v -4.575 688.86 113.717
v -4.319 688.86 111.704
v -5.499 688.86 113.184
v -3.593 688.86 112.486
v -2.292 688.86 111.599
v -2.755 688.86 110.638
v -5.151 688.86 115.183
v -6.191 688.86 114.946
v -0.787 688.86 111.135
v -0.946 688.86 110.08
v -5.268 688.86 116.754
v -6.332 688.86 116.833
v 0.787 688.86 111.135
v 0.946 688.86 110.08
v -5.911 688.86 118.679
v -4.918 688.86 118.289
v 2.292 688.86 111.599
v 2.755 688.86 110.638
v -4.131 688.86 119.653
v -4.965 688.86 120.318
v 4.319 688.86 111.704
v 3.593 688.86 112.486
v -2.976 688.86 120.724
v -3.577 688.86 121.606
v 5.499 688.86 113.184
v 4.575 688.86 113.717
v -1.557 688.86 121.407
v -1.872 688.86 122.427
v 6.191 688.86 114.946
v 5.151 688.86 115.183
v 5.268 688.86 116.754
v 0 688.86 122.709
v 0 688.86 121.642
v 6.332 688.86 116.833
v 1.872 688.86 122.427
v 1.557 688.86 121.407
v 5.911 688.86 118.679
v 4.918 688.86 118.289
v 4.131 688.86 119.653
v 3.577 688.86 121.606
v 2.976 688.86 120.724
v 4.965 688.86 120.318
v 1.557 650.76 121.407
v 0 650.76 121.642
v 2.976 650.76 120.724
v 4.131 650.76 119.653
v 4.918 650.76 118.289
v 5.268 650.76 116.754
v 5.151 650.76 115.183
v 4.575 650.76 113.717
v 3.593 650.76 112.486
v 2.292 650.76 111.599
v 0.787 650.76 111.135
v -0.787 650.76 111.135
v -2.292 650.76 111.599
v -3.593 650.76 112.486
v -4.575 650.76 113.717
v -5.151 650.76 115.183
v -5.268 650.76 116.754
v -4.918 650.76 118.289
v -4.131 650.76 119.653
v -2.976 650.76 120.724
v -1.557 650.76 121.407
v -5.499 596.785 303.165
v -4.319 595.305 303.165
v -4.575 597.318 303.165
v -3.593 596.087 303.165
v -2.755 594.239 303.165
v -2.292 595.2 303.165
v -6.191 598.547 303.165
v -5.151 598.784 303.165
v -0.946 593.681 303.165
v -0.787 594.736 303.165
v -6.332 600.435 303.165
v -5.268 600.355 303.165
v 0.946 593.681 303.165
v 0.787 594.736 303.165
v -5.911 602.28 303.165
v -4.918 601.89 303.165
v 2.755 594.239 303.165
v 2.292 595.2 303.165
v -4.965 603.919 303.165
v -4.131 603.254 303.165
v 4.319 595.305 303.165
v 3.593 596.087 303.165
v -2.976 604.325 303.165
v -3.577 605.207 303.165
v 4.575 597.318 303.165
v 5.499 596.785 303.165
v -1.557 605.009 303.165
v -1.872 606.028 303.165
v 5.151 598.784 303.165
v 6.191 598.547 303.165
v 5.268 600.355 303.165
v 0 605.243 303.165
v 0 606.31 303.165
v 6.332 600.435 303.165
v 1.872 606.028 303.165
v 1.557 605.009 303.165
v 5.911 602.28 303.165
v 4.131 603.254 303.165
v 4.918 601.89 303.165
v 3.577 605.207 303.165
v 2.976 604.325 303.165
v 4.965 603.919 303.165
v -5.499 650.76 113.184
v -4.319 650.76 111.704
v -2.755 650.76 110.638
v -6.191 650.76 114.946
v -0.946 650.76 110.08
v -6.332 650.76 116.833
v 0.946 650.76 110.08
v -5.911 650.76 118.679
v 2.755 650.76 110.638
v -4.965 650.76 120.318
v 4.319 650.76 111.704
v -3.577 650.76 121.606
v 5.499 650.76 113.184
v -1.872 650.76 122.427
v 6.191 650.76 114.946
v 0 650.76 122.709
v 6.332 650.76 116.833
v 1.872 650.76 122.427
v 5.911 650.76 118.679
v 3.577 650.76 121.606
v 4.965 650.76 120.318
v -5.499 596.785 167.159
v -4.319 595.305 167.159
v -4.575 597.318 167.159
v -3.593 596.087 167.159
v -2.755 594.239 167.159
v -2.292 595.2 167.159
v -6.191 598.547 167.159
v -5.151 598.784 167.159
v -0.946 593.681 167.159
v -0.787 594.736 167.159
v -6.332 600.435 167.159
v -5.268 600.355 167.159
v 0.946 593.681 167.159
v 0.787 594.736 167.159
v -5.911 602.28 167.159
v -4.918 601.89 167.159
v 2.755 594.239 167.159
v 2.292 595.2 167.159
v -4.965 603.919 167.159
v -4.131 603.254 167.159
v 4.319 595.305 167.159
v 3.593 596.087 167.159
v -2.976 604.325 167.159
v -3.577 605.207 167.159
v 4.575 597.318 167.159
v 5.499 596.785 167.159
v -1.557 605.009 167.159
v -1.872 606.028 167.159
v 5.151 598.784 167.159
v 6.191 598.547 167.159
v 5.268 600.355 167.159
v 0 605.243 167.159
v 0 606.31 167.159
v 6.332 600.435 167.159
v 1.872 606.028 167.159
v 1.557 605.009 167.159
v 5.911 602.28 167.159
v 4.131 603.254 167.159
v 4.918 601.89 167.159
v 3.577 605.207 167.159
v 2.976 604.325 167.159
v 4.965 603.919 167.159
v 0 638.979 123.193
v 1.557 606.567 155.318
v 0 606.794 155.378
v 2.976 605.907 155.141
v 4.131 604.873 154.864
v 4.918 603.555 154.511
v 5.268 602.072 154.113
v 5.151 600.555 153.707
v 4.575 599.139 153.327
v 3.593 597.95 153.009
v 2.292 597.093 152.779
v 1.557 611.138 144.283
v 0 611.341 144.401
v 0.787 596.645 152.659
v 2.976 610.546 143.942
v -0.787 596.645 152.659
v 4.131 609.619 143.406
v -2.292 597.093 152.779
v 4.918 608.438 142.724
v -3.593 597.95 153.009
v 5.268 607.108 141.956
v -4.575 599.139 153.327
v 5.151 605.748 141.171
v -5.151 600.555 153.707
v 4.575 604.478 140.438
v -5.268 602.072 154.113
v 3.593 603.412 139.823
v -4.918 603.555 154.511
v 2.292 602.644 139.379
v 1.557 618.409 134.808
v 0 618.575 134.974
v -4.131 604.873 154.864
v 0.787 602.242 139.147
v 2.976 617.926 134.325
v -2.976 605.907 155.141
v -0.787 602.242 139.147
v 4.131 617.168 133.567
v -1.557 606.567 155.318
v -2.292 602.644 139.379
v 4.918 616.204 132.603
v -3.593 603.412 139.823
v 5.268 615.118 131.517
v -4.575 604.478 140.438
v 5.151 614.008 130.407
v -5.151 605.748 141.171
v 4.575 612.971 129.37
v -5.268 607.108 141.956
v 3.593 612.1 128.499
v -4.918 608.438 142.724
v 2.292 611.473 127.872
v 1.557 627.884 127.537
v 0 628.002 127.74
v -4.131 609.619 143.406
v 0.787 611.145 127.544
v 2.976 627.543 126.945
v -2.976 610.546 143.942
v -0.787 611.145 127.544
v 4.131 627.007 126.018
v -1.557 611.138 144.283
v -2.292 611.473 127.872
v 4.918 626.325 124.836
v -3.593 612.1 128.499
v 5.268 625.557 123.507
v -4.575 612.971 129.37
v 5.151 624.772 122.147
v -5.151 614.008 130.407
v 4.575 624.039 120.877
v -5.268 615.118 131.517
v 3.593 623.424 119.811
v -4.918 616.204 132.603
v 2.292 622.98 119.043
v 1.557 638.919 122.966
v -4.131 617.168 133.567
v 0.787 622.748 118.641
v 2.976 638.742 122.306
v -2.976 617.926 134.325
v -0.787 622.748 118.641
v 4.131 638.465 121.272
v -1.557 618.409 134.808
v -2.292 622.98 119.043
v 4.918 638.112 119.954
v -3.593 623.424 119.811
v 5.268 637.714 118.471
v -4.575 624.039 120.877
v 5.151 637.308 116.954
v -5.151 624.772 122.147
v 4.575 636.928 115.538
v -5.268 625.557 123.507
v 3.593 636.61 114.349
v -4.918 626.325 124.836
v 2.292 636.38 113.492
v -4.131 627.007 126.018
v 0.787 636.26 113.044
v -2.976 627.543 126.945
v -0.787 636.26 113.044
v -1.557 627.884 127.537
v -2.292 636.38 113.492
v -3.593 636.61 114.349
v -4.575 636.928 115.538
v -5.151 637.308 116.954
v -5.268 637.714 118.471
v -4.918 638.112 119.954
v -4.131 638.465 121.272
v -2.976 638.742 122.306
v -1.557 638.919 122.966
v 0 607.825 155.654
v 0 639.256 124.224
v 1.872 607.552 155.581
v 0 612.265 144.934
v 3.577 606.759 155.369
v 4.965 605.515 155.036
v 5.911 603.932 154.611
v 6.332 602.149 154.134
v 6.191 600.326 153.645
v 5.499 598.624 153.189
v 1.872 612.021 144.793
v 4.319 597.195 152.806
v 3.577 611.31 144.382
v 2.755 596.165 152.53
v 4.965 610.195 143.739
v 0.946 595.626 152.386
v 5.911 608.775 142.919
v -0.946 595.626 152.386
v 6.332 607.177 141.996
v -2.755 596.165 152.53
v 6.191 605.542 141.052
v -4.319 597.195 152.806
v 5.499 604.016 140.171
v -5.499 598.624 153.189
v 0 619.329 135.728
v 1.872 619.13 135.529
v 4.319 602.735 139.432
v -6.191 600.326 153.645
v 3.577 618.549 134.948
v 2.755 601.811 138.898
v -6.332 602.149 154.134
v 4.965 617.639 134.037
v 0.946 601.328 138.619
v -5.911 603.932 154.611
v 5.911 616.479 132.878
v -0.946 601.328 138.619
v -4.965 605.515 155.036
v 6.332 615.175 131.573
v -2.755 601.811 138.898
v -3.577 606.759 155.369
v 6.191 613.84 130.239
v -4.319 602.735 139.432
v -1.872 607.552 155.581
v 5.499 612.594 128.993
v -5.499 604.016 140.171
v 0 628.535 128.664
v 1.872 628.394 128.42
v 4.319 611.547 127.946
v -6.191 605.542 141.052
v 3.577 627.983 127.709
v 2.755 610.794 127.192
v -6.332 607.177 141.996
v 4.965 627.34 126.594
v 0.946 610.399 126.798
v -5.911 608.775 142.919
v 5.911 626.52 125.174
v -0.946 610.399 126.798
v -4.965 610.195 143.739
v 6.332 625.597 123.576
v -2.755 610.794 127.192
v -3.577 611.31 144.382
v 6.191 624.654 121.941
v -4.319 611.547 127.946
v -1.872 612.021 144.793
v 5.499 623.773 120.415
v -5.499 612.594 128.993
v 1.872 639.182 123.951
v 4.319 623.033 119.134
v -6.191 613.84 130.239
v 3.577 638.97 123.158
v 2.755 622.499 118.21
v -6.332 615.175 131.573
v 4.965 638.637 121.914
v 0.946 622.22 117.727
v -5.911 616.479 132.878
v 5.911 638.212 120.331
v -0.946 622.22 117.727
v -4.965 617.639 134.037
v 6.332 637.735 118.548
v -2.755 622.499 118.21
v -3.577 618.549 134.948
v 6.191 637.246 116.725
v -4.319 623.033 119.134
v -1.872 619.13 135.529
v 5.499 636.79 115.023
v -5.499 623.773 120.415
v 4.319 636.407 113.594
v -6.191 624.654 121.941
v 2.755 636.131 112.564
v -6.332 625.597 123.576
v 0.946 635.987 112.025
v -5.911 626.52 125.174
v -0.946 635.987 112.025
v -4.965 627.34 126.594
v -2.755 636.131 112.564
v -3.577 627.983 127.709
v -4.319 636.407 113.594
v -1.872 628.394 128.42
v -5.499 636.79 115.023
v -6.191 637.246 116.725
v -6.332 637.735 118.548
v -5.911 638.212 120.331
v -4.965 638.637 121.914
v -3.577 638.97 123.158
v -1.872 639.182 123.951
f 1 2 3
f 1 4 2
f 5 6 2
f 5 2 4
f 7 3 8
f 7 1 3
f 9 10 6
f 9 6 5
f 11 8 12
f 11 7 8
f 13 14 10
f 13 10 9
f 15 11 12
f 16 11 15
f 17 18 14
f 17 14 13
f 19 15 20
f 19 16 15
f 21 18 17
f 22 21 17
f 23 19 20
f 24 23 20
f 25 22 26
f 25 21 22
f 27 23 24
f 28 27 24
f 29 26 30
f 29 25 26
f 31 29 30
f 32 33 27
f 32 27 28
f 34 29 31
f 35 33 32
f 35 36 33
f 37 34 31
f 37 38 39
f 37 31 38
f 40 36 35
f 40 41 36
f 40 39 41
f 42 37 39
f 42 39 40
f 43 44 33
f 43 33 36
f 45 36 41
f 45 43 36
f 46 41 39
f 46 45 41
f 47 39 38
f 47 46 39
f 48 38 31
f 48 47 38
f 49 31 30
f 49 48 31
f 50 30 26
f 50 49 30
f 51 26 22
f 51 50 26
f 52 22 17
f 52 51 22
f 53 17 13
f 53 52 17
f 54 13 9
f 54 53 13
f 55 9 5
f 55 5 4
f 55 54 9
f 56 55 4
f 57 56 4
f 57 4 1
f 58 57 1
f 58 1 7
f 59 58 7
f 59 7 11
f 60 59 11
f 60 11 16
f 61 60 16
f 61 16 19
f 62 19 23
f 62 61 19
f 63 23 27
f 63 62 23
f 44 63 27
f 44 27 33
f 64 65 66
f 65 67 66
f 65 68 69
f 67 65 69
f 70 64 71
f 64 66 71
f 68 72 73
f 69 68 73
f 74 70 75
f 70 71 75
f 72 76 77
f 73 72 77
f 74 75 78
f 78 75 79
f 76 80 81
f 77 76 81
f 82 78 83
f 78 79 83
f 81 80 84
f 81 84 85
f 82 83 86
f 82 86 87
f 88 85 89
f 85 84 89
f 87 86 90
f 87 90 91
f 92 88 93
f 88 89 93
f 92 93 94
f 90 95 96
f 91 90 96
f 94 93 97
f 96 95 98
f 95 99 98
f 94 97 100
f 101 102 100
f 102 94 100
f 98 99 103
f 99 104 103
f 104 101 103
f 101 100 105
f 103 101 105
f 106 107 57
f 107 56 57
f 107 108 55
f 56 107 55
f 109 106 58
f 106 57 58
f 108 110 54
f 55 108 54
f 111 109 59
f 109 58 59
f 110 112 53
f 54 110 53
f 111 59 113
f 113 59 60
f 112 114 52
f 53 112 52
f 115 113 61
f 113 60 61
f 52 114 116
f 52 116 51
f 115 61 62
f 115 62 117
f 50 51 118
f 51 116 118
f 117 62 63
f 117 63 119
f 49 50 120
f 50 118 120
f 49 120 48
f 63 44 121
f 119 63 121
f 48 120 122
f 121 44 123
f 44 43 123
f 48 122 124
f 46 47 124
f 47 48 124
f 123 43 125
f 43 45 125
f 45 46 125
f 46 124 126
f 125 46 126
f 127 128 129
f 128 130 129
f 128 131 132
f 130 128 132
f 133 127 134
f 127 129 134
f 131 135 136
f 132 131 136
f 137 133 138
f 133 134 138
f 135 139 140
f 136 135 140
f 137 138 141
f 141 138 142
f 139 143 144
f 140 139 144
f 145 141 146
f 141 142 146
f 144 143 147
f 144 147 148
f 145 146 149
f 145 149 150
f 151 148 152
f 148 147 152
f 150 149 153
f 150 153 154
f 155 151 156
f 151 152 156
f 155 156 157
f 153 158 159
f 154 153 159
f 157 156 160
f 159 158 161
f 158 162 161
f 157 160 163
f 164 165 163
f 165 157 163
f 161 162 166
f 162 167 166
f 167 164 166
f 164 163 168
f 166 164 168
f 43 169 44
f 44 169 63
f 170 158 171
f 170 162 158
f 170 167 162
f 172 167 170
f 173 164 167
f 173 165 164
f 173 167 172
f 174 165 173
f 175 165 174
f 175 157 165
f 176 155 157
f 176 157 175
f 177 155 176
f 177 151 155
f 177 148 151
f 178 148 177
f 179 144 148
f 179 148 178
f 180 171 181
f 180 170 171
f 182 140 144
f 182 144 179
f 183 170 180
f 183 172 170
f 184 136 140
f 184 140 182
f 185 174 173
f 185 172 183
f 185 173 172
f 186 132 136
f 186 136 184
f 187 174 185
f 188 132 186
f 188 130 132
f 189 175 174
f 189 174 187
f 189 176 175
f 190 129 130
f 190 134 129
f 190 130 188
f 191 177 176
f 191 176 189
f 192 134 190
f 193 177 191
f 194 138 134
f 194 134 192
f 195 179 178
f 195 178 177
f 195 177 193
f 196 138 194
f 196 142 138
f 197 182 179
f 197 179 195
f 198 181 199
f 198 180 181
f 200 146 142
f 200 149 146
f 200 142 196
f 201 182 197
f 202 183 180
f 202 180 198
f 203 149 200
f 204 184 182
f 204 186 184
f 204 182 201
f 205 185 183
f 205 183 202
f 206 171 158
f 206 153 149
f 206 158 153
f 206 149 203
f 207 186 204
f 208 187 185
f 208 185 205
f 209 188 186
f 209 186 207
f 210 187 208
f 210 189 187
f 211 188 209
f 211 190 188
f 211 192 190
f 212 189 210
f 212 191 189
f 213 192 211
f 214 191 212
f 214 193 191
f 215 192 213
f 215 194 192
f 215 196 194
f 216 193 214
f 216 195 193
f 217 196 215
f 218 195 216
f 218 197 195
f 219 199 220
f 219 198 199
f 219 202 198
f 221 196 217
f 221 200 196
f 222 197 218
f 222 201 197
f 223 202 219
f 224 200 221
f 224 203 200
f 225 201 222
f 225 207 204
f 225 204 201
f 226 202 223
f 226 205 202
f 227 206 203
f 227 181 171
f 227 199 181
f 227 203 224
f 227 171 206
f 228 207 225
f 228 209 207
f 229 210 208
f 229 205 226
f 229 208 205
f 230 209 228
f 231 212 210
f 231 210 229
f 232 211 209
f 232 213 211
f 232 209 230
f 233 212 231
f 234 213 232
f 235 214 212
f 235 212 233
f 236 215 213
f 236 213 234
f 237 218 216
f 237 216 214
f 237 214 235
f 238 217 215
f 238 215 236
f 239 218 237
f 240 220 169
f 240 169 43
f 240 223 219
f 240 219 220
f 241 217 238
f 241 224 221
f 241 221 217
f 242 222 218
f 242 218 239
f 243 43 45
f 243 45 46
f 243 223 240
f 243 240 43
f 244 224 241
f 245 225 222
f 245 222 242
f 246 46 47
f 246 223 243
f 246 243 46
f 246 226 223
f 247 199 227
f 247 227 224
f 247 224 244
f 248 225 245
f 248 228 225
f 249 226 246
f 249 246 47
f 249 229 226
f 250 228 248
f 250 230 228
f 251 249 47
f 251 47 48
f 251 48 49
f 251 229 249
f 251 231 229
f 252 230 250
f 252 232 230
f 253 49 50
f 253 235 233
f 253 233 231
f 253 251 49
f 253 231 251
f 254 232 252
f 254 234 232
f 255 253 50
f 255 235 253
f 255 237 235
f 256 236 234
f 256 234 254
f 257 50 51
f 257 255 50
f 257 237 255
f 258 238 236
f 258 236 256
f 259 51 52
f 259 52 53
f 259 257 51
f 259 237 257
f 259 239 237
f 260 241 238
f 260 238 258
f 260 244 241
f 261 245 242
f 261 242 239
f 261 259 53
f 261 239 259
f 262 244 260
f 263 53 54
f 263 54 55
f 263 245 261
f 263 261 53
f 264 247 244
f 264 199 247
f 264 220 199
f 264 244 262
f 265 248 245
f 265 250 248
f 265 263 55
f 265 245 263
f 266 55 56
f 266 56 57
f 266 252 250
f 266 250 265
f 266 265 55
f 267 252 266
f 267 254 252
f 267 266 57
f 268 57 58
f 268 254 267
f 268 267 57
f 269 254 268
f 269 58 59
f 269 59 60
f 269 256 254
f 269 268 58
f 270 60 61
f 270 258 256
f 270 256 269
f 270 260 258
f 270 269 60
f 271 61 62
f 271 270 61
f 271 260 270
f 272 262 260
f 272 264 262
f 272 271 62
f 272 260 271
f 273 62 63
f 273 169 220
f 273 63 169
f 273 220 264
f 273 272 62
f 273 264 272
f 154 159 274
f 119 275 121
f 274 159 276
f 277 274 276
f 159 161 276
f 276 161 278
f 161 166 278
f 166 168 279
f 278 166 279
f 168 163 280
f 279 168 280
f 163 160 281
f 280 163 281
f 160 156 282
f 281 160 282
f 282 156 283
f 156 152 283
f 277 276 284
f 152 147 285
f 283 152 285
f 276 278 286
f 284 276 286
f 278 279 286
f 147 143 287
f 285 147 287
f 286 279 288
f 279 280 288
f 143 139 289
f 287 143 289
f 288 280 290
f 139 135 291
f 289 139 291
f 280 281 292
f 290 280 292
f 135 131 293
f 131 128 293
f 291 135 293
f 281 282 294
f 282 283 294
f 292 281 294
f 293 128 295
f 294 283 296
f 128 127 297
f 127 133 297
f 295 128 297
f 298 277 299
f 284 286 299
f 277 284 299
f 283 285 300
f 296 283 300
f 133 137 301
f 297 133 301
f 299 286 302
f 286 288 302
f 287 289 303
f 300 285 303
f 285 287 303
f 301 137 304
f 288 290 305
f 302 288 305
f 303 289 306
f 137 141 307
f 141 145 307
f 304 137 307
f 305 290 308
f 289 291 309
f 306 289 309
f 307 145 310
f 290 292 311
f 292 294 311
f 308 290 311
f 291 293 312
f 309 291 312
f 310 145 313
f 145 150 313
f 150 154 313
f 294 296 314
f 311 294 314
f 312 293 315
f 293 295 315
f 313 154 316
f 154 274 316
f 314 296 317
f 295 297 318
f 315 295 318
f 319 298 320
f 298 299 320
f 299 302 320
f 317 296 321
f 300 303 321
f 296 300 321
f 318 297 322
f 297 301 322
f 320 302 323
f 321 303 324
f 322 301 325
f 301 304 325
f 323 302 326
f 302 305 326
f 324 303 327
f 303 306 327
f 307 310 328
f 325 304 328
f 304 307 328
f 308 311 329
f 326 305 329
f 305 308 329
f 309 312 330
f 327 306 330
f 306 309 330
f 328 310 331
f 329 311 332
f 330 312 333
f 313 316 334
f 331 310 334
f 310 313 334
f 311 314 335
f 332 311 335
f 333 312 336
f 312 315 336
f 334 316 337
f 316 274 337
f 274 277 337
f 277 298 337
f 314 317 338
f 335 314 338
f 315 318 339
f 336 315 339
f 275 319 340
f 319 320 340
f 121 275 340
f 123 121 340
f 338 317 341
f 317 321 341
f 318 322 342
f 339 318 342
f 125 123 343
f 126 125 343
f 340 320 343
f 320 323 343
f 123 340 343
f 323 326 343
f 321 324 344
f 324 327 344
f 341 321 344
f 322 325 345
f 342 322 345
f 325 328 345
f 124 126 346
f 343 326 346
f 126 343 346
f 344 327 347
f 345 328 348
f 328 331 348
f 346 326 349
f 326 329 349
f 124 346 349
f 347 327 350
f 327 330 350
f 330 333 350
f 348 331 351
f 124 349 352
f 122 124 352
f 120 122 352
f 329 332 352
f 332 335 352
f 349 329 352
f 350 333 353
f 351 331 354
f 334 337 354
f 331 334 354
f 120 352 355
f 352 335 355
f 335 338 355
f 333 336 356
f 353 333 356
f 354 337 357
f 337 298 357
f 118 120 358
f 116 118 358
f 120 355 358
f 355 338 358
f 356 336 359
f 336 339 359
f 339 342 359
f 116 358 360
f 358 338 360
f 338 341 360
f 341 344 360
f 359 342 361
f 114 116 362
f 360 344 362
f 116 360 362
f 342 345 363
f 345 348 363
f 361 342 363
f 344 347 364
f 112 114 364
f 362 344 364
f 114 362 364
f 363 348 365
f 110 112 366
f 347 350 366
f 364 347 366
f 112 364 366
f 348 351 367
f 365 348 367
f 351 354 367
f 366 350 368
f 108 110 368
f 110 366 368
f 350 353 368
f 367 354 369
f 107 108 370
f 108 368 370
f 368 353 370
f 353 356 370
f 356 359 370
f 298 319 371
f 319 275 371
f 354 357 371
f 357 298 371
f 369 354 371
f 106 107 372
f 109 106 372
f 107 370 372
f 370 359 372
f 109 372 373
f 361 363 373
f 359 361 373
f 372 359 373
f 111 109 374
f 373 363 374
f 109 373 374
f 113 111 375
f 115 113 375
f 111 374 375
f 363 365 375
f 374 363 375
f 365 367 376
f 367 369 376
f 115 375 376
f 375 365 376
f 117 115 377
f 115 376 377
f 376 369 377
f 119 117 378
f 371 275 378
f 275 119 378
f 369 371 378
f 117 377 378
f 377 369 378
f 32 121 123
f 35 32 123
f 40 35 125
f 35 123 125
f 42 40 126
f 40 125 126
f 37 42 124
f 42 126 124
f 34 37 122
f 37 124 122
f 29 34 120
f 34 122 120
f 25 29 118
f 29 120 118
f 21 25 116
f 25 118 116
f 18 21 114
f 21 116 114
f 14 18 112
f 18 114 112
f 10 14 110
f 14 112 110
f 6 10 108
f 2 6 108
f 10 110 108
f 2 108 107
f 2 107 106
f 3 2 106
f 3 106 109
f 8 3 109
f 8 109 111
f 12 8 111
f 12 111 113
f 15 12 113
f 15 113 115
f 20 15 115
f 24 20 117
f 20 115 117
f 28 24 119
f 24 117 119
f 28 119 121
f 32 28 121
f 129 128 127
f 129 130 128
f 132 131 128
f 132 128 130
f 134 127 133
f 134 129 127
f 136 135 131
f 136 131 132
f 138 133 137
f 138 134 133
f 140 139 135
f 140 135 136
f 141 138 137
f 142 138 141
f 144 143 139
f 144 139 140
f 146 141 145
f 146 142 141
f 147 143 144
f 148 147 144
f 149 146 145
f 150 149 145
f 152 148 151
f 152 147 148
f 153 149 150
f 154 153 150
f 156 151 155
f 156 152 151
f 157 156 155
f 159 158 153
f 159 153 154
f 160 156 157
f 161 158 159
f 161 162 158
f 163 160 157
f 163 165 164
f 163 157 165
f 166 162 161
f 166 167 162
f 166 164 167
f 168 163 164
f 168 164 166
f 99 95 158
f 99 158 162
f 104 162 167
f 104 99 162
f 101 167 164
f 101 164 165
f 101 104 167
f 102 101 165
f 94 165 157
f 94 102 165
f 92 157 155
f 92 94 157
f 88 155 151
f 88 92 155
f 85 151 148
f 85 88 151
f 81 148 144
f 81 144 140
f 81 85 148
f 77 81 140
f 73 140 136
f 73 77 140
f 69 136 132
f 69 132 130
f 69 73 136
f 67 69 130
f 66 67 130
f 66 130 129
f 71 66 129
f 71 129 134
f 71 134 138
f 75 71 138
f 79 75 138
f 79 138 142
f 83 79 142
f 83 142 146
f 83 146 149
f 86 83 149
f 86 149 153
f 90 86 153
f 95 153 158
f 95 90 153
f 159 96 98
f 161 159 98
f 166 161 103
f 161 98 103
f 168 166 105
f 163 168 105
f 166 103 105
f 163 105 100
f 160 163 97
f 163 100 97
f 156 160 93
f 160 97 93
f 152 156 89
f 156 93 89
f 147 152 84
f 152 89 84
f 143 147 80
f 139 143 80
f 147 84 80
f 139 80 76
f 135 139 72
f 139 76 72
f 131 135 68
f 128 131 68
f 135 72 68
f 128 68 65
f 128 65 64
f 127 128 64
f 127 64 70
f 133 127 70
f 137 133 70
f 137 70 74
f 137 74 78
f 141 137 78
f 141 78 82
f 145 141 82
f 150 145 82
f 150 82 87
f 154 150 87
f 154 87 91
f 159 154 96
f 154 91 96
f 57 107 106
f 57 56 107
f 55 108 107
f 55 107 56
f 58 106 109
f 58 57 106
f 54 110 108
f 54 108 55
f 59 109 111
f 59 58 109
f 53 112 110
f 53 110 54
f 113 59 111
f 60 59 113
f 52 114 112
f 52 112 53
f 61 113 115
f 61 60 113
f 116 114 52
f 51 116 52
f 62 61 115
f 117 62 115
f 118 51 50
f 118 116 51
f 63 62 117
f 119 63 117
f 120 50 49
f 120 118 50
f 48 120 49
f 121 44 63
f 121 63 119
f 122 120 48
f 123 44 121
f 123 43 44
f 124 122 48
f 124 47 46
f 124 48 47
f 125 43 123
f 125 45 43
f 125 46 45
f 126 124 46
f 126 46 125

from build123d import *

# Parameters (mm, degrees)
SKETCH11_R                = 6.35
SKETCH11_R_2              = 5.2832
PIPE_0_5_SCH_40_1_DEPTH   = 136.005637638
SKETCH11_ON_SEGMENT_2_R   = 6.35
SKETCH11_ON_SEGMENT_2_R_2 = 5.2832
PIPE_0_5_SCH_40_1_2_ANGLE = 90
SKETCH11_ON_SEGMENT_3_R   = 6.35
SKETCH11_ON_SEGMENT_3_R_2 = 5.2832
PIPE_0_5_SCH_40_1_3_DEPTH = 38.1


with BuildPart() as part:
    # Sketch11 → Pipe 0.5 SCH 40(1) (new body)
    with BuildSketch(Plane(origin=(0, 599.960019272, 303.164595711), x_dir=(0, 1, 0), z_dir=(0, 0, -1))):
        Circle(SKETCH11_R)
        Circle(SKETCH11_R_2, mode=Mode.SUBTRACT)
    extrude(amount=PIPE_0_5_SCH_40_1_DEPTH)


with BuildPart() as body_2:
    # Sketch11 on segment 2 (carried to the start of arc 2) → Pipe 0.5 SCH 40_1 2 (revolve)
    with BuildSketch(Plane(origin=(0, 599.960019272, 167.158958073), x_dir=(0, 1, 0), z_dir=(0, 0, -1))):
        Circle(SKETCH11_ON_SEGMENT_2_R)
        Circle(SKETCH11_ON_SEGMENT_2_R_2, mode=Mode.SUBTRACT)
    revolve(axis=Axis((0, 650.760019272, 167.158958073), (1, 0, 0)), revolution_arc=PIPE_0_5_SCH_40_1_2_ANGLE)


with BuildPart() as body_3:
    # Sketch11 on segment 3 (carried to segment 3) → Pipe 0.5 SCH 40_1 3 (new body)
    with BuildSketch(Plane(origin=(0, 650.760019272, 116.358958073), x_dir=(0, 0, 1), z_dir=(0, 1, 0))):
        Circle(SKETCH11_ON_SEGMENT_3_R)
        Circle(SKETCH11_ON_SEGMENT_3_R_2, mode=Mode.SUBTRACT)
    extrude(amount=PIPE_0_5_SCH_40_1_3_DEPTH)


solid = Compound([part.part, body_2.part, body_3.part])
